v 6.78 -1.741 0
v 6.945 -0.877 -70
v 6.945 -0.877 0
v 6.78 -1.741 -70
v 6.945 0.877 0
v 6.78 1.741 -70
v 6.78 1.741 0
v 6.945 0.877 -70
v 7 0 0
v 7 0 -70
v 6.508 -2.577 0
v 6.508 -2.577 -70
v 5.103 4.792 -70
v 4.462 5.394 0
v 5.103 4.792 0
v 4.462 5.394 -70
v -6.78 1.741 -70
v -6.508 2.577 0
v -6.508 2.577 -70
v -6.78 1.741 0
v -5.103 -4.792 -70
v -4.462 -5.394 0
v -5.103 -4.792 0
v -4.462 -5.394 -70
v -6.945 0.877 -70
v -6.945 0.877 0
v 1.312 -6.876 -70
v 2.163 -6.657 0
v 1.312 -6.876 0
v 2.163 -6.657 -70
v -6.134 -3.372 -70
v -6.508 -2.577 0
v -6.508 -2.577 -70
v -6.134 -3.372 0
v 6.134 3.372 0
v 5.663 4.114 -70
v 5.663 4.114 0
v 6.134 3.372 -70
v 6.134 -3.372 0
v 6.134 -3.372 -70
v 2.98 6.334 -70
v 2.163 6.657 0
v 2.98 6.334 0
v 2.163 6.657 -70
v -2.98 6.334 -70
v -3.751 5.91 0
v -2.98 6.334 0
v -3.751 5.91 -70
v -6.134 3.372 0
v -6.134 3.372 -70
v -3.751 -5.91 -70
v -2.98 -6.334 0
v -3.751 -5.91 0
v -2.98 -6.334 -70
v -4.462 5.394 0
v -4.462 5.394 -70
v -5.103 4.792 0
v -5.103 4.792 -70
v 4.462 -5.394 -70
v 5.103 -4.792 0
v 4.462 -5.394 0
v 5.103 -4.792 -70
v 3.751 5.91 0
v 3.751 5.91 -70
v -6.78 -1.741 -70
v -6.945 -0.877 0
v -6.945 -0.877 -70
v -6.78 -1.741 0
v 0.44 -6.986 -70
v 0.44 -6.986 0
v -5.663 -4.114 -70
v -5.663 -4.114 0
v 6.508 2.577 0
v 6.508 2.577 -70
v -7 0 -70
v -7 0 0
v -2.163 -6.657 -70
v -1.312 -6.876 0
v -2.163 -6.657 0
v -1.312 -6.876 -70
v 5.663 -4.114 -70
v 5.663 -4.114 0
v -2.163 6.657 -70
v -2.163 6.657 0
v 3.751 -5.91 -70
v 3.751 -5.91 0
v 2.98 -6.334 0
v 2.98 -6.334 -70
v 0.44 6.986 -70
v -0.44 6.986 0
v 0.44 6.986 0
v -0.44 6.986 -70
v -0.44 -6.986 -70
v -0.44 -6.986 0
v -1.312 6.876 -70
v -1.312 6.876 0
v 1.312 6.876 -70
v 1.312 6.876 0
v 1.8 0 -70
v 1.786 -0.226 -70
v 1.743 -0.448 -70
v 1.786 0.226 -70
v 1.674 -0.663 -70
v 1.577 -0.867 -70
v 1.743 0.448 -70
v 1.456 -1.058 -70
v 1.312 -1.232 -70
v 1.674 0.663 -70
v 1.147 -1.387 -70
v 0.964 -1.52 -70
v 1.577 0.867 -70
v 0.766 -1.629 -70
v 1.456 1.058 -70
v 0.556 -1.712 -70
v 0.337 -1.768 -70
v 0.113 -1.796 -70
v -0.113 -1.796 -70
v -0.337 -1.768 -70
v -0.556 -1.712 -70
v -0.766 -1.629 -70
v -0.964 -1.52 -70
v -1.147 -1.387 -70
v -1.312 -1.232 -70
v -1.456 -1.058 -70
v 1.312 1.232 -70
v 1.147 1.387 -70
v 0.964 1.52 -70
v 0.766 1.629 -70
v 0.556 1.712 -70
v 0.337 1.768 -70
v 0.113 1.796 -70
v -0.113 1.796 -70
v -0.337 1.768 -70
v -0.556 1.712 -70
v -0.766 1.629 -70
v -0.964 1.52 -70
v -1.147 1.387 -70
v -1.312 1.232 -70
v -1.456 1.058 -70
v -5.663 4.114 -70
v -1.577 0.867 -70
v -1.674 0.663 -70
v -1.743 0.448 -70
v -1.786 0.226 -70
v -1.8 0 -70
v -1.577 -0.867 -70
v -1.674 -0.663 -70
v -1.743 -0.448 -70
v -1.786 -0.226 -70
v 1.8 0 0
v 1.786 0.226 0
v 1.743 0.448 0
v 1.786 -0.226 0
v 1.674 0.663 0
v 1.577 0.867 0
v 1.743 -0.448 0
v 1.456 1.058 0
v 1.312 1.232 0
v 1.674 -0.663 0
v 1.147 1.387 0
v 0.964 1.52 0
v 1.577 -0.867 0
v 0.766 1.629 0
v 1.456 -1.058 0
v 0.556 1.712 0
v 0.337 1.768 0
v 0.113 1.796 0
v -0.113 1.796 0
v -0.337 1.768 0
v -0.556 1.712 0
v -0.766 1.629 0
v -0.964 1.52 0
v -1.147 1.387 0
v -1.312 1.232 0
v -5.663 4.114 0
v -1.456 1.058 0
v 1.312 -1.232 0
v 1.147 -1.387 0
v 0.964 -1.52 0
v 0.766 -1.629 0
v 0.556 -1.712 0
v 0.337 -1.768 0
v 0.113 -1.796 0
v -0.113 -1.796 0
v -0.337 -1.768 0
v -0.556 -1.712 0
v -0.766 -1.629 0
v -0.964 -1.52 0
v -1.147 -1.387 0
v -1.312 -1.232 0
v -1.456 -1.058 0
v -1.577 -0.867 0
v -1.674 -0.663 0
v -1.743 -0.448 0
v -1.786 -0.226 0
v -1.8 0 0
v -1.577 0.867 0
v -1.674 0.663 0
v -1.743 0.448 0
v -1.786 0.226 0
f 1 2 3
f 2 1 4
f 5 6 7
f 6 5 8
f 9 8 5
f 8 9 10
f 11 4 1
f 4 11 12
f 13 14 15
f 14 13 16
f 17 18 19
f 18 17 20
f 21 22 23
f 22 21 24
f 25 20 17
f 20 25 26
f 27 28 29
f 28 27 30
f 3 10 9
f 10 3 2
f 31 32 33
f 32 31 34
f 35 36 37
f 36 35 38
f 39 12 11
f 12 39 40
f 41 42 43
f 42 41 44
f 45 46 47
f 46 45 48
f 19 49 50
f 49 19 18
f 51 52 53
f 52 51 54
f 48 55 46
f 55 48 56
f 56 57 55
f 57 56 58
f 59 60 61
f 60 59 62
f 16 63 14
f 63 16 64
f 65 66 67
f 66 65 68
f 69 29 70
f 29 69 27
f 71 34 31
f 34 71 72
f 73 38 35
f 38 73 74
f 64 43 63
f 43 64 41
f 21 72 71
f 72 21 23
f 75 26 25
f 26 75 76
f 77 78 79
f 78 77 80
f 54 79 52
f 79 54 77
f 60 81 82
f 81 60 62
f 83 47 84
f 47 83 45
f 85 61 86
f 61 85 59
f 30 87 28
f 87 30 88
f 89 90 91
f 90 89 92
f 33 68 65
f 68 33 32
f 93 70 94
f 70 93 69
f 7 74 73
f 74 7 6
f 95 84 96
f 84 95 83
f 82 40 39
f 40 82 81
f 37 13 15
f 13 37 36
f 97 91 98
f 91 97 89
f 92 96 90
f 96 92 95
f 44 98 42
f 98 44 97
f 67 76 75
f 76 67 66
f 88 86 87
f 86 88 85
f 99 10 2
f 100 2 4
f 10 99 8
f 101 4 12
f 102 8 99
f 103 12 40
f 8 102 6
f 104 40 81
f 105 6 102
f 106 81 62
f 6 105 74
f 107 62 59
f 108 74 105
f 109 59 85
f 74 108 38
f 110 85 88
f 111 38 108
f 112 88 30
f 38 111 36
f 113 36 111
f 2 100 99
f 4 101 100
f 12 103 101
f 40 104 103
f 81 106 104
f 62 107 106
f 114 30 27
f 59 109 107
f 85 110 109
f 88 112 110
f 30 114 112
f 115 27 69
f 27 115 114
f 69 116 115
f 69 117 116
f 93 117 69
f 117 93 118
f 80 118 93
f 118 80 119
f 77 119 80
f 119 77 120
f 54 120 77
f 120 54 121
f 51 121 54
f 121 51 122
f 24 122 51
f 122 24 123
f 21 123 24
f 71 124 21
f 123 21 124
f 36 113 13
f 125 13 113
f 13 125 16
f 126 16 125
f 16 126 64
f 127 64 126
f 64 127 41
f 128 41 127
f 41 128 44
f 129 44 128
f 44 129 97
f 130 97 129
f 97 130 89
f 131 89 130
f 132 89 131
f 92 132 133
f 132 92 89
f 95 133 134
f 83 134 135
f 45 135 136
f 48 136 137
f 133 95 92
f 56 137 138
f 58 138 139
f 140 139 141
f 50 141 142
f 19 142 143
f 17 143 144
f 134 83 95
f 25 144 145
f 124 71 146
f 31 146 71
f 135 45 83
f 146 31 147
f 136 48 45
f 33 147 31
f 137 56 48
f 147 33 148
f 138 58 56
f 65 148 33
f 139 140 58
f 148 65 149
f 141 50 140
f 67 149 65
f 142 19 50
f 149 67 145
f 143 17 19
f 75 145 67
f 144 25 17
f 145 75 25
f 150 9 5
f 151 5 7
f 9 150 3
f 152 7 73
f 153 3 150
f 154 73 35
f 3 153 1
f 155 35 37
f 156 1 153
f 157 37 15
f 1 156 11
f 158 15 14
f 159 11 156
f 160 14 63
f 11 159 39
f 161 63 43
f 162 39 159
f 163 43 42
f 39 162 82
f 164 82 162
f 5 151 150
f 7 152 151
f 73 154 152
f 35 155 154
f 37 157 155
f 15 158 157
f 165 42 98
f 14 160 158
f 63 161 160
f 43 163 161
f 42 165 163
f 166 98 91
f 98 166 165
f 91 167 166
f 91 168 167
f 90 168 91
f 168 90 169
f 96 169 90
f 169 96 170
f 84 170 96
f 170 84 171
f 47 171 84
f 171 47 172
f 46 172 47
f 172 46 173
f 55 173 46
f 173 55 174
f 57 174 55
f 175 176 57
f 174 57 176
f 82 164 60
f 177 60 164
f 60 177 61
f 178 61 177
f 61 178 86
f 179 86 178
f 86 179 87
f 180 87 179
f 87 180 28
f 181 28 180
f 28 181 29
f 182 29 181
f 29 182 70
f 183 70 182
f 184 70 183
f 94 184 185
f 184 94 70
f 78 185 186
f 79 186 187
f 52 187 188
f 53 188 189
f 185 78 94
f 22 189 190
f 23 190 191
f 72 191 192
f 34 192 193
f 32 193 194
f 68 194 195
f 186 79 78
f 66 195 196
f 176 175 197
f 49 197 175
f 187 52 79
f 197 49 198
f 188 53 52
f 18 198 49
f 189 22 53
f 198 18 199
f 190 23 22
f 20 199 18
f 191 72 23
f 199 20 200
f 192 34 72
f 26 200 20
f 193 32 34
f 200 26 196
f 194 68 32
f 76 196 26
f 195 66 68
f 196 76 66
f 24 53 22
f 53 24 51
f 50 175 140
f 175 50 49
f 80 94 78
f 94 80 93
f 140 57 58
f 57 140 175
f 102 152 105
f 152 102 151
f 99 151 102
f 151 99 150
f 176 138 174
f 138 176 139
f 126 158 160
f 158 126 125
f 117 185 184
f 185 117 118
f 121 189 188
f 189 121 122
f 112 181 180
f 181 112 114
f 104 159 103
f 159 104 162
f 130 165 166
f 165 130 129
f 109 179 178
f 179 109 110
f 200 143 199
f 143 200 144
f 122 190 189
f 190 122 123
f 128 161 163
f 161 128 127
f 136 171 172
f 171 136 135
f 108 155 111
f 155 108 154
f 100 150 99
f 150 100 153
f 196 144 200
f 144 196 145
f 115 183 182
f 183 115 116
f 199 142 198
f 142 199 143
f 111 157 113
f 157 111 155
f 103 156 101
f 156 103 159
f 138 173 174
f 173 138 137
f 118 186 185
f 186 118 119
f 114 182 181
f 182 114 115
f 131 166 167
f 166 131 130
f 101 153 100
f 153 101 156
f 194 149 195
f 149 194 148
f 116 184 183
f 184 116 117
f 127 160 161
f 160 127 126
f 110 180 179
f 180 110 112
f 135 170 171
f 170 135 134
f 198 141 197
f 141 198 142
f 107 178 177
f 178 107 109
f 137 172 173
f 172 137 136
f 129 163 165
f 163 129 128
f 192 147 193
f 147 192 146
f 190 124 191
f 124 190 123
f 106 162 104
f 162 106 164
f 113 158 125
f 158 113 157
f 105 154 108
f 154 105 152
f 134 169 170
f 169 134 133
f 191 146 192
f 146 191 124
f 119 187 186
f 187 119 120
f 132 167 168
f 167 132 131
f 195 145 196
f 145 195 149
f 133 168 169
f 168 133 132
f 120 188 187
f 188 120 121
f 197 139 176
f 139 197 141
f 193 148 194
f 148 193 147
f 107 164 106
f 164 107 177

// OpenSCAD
$fn = 50;


difference() {
	union() {
		translate(v = [0, 0, -70.0000000000]) {
			cylinder(h = 70, r = 7.0000000000);
		}
		cylinder(h = 0, r = 17.0000000000);
	}
	union() {
		#translate(v = [0, 0, -70]) {
			cylinder(h = 70, r = 1.8000000000);
		}
	}
}
